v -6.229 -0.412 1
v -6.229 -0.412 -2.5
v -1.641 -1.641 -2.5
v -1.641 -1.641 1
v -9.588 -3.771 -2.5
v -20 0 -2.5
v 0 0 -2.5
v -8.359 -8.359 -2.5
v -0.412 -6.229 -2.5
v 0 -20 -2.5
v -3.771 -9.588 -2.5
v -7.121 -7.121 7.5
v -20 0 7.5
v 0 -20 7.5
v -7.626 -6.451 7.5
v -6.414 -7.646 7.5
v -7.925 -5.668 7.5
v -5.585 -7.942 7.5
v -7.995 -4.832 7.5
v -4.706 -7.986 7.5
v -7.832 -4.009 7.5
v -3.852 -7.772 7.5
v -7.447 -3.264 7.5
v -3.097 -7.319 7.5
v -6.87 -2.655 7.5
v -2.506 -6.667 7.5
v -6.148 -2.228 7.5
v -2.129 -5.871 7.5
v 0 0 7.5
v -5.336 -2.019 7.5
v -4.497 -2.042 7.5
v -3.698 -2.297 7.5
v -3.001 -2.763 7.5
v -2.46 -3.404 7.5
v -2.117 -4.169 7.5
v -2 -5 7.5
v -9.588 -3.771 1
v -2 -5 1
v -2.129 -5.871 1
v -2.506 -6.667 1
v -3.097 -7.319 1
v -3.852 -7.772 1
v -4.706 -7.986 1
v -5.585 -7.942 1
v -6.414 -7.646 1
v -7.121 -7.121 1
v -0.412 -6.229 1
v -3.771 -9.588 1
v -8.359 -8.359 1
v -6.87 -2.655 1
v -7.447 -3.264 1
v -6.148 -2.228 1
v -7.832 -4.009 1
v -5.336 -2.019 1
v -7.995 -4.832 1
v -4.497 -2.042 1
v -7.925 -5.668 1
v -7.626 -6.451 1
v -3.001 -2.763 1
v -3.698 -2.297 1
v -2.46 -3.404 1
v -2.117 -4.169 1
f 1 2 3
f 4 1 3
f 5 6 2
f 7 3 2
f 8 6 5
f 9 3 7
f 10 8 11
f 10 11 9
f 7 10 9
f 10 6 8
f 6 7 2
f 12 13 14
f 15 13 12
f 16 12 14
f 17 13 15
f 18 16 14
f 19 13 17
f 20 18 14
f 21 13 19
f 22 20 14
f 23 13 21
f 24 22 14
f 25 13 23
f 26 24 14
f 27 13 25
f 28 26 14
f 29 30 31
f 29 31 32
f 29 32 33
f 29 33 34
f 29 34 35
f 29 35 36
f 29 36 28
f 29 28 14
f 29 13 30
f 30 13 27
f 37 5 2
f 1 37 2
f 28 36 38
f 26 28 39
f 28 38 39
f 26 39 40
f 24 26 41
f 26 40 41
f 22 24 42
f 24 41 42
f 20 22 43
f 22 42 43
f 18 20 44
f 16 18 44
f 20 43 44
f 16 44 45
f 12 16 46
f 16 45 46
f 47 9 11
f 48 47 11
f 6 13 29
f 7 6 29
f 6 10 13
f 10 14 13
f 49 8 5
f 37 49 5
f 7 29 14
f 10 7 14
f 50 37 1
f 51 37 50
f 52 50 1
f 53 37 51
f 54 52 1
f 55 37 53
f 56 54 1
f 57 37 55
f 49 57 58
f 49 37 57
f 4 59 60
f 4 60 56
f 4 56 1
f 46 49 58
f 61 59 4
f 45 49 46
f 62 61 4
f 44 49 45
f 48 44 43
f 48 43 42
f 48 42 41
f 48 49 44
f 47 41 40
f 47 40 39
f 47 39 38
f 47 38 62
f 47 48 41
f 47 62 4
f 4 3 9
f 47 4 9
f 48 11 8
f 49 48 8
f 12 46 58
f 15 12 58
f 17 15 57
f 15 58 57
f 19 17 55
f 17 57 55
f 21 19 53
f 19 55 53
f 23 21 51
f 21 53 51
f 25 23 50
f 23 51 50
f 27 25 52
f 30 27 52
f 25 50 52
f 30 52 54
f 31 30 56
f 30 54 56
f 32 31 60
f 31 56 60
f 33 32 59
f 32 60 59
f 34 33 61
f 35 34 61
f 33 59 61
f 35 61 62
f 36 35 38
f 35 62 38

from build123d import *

# Parameters (mm, degrees)
F1_DEPTH = 7.5
F2_DEPTH = 2.5
F4_DEPTH = 25
F5_DEPTH = 3.5


with BuildPart() as f1:
    # F0 (on Top) → F1 (new body)
    with BuildSketch(Plane.XY):
        Polygon((0, -20), (0, 0), (-20, 0), align=None)
    extrude(amount=F1_DEPTH)

    # F1_face (on face) → F2 (join)
    with BuildSketch(Plane(origin=(-6.666667, -6.666667, 0), x_dir=(1, 0, 0), z_dir=(0, 0, -1))):
        Polygon((6.666667, -6.666667), (6.666667, 13.333333), (-13.333333, -6.666667), align=None)
    extrude(amount=F2_DEPTH)

    # F3 (on face) → F4 (cut)
    with BuildSketch(Plane(origin=(0, 0, -2.5), x_dir=(1, 0, 0), z_dir=(0, 0, -1))):
        with BuildLine():
            ThreePointArc((-2, 5), (-3.85195, 7.771639), (-7.12132, 7.12132))
            ThreePointArc((-7.12132, 7.12132), (-6.14805, 2.228361), (-2, 5))
        make_face()
    extrude(amount=-F4_DEPTH, mode=Mode.SUBTRACT)

    # F3 (on face) → F5 (cut)
    with BuildSketch(Plane(origin=(0, 0, -2.5), x_dir=(1, 0, 0), z_dir=(0, 0, -1))):
        Polygon((-3.77061, 9.588148), (-8.358757, 8.358757), (-9.588148, 3.77061), (-6.22939, 0.411852), (-1.641243, 1.641243), (-0.411852, 6.22939), align=None)
        with BuildLine():
            ThreePointArc((-2, 5), (-6.14805, 2.228361), (-7.12132, 7.12132))
            ThreePointArc((-7.12132, 7.12132), (-3.85195, 7.771639), (-2, 5))
        make_face(mode=Mode.SUBTRACT)
    extrude(amount=-F5_DEPTH, mode=Mode.SUBTRACT)


solid = f1.part
